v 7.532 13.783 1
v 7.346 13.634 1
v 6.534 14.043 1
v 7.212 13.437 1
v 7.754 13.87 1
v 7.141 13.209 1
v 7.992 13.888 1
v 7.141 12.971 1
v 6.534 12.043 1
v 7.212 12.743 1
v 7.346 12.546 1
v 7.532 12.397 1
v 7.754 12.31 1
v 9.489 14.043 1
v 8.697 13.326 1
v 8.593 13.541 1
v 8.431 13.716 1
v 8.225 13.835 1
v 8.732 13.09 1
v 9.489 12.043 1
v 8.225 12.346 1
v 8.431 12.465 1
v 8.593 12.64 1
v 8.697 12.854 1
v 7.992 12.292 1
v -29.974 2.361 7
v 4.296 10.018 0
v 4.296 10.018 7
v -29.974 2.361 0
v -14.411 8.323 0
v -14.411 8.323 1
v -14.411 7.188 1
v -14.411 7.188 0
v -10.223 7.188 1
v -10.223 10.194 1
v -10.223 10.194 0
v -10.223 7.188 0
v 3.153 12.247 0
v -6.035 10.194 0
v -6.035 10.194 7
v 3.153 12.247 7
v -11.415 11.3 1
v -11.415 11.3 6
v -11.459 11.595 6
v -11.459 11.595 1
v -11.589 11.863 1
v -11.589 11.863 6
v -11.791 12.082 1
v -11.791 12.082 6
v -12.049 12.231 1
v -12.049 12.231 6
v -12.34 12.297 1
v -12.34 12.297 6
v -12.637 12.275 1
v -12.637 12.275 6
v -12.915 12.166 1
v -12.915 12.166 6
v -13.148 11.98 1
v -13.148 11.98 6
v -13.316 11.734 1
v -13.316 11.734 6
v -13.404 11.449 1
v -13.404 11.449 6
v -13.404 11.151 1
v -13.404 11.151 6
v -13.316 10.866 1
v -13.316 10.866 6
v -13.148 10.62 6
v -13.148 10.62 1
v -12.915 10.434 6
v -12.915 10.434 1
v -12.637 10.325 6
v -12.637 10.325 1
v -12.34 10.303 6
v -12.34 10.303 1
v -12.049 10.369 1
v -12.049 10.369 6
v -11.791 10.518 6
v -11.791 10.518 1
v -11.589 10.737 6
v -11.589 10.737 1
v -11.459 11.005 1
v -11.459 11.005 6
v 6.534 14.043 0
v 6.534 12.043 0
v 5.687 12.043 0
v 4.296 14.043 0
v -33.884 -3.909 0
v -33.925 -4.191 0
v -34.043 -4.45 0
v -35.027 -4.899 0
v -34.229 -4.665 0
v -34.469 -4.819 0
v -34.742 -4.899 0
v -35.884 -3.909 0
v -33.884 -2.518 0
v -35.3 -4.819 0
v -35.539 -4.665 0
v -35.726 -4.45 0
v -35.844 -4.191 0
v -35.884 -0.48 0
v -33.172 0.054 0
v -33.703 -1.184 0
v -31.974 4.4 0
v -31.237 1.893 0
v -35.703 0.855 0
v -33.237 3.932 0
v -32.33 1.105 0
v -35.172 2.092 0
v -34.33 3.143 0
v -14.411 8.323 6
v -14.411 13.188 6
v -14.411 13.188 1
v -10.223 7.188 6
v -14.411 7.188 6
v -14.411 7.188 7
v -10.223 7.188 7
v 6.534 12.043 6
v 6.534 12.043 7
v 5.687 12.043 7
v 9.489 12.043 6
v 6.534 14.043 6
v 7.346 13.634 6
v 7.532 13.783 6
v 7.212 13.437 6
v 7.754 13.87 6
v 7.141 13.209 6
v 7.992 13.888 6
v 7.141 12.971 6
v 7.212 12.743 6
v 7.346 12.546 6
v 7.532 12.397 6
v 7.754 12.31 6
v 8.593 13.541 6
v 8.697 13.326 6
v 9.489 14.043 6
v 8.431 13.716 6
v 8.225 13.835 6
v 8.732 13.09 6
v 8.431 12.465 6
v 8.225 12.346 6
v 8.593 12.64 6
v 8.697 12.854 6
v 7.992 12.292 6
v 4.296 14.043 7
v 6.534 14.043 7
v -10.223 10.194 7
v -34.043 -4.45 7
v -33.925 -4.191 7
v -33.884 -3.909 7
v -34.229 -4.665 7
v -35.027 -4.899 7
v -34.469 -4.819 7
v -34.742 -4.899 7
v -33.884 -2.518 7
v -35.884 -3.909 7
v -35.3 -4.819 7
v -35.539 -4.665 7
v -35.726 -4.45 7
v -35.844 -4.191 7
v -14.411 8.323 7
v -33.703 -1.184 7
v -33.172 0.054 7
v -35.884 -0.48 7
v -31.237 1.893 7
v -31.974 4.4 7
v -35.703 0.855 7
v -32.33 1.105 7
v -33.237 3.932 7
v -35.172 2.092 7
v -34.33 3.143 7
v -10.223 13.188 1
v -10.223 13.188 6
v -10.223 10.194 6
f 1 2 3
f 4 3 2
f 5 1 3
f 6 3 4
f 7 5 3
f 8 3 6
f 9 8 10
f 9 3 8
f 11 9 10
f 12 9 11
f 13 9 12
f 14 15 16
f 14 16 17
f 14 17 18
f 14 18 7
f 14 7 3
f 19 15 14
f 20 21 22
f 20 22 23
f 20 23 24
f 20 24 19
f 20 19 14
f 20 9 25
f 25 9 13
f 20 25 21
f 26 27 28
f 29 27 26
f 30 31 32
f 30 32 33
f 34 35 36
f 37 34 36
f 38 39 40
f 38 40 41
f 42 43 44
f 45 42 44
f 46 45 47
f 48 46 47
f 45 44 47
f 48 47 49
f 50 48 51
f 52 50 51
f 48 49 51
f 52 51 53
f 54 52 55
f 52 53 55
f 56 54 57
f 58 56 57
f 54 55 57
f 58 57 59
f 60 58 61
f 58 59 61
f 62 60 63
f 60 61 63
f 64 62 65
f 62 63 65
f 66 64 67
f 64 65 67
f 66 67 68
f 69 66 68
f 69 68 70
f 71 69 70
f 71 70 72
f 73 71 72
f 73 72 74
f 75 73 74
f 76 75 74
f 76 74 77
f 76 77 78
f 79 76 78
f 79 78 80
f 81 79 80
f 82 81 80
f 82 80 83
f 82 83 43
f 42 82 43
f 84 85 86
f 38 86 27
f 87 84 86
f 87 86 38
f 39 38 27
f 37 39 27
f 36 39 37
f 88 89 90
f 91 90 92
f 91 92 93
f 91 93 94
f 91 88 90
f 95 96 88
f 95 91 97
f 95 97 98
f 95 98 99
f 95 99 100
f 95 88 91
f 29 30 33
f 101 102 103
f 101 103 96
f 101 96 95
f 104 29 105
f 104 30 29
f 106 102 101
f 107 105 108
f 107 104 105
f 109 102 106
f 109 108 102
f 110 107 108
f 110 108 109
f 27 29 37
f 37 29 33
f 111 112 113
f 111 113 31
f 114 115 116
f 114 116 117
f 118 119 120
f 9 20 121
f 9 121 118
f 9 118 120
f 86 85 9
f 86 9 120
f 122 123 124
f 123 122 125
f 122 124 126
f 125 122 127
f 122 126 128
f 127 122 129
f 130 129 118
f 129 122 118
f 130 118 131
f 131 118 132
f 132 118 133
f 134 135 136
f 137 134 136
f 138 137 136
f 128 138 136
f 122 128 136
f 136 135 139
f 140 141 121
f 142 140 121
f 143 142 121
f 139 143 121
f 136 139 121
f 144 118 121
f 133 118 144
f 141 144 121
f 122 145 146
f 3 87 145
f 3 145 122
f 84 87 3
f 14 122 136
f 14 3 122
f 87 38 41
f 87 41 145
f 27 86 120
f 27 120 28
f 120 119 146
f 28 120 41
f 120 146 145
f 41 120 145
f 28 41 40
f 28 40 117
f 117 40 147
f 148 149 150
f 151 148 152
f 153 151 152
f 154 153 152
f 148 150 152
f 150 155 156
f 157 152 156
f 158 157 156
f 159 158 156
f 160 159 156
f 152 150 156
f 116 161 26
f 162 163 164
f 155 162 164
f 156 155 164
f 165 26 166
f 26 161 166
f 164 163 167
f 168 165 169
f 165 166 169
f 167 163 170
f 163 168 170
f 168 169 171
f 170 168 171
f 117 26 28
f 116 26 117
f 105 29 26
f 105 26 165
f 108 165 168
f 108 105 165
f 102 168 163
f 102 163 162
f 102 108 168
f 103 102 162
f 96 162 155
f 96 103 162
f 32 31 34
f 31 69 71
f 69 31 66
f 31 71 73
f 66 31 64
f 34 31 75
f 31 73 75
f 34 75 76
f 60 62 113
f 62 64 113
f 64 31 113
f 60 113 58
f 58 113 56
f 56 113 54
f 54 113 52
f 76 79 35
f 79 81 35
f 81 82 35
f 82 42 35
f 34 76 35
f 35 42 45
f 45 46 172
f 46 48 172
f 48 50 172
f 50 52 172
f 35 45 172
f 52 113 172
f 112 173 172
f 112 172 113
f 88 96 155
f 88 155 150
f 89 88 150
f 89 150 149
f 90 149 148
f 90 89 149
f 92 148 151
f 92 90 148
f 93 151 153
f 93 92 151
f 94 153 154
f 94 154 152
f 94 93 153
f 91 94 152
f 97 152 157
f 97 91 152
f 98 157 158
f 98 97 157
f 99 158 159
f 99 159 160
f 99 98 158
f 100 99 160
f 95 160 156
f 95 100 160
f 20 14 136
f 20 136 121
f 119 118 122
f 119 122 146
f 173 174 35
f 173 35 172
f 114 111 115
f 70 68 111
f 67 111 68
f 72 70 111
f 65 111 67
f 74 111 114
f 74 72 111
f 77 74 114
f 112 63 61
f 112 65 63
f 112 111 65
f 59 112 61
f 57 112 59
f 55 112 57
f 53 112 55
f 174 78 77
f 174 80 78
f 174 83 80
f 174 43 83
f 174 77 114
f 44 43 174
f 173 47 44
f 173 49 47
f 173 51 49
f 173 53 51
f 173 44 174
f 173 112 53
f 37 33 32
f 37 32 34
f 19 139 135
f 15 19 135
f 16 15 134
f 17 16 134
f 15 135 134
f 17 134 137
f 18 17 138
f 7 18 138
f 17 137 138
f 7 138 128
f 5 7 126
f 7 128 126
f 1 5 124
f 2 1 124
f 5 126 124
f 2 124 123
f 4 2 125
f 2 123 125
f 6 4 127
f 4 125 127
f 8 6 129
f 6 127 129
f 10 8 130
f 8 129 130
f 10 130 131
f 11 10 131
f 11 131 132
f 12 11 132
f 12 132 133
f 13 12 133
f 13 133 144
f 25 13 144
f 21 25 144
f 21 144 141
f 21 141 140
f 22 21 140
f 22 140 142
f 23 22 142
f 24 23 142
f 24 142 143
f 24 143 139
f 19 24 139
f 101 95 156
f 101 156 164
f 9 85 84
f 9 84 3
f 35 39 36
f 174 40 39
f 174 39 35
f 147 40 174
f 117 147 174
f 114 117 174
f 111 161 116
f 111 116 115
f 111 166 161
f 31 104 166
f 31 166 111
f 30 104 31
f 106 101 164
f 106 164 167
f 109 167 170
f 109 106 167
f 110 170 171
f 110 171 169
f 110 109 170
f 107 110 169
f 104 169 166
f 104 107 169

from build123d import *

# Parameters (mm, degrees)
BOSS_EXTRUDE2_DEPTH = 7
BOSS_EXTRUDE3_DEPTH = 7
SKETCH3_R           = 1
CUT_EXTRUDE1_DEPTH  = 7
SKETCH4_R           = 0.8
CUT_EXTRUDE2_DEPTH  = 7
SKETCH6_W           = 2.954985002
SKETCH6_H           = 1
CUT_EXTRUDE3_DEPTH  = 10
SKETCH7_W           = 4.187886823
SKETCH7_H           = 1
CUT_EXTRUDE5_DEPTH  = 6


with BuildPart() as part:
    # Sketch1 → Boss-Extrude2 (new body)
    with BuildSketch(Plane.XY):
        with BuildLine():
            Line((3.153391707, 12.247099593), (4.296460399, 14.043350396))
            Line((4.296460399, 14.043350396), (9.489380334, 14.043350396))
            Line((9.489380334, 14.043350396), (9.489380334, 12.043350396))
            Line((9.489380334, 12.043350396), (5.687282028, 12.043350396))
            Line((5.687282028, 12.043350396), (4.296460399, 10.01751105))
            Line((4.296460399, 10.01751105), (-29.974468214, 2.361481073))
            ThreePointArc((-29.974468214, 2.361481073), (-32.786312372, 0.608216504), (-33.884352793, -2.51823699))
            Line((-33.884352793, -2.51823699), (-33.884352793, -3.909471954))
            ThreePointArc((-33.884352793, -3.909471954), (-34.884352793, -4.909471954), (-35.884352793, -3.909471954))
            Line((-35.884352793, -3.909471954), (-35.884352793, -0.480084513))
            ThreePointArc((-35.884352793, -0.480084513), (-34.786312372, 2.646368981), (-31.974468214, 4.399633549))
            Line((-31.974468214, 4.399633549), (3.153391707, 12.247099593))
        make_face()
    extrude(amount=BOSS_EXTRUDE2_DEPTH)

    # Sketch2 → Boss-Extrude3 (add)
    with BuildSketch(Plane.XY.offset(7)):
        Polygon((-6.034764609, 10.194491069), (-10.222651431, 10.194491069), (-10.222651431, 13.1883213), (-14.410538254, 13.1883213), (-14.410538254, 10.194491069), (-14.410538254, 8.323366571), align=None)
    extrude(amount=-BOSS_EXTRUDE3_DEPTH)

    # Sketch3 → Cut-Extrude1 (cut)
    with BuildSketch(Plane.XY.offset(7)):
        with Locations((-12.414768406, 11.299883581)):
            Circle(SKETCH3_R)
    extrude(amount=-CUT_EXTRUDE1_DEPTH, mode=Mode.SUBTRACT)

    # Sketch4 → Cut-Extrude2 (cut)
    with BuildSketch(Plane.XY.offset(7)):
        with Locations((7.932339973, 13.090243395)):
            Circle(SKETCH4_R)
    extrude(amount=-CUT_EXTRUDE2_DEPTH, mode=Mode.SUBTRACT)

    # Sketch6 → Cut-Extrude3 (cut)
    with BuildSketch(Plane.XZ.offset(-12.043350396)):
        with Locations((8.011887833, 6.5)):
            Rectangle(SKETCH6_W, SKETCH6_H)
        with Locations((8.011887833, 0.5)):
            Rectangle(SKETCH6_W, SKETCH6_H)
    extrude(amount=-CUT_EXTRUDE3_DEPTH, mode=Mode.SUBTRACT)

    # Sketch7 → Cut-Extrude5 (cut)
    with BuildSketch(Plane(origin=(0, 13.1883213, 0), x_dir=(1, 0, 0), z_dir=(0, 1, 0))):
        with Locations((-12.316594843, -0.5)):
            Rectangle(SKETCH7_W, SKETCH7_H)
        with Locations((-12.316594843, -6.5)):
            Rectangle(SKETCH7_W, SKETCH7_H)
    extrude(amount=-CUT_EXTRUDE5_DEPTH, mode=Mode.SUBTRACT)


solid = part.part
